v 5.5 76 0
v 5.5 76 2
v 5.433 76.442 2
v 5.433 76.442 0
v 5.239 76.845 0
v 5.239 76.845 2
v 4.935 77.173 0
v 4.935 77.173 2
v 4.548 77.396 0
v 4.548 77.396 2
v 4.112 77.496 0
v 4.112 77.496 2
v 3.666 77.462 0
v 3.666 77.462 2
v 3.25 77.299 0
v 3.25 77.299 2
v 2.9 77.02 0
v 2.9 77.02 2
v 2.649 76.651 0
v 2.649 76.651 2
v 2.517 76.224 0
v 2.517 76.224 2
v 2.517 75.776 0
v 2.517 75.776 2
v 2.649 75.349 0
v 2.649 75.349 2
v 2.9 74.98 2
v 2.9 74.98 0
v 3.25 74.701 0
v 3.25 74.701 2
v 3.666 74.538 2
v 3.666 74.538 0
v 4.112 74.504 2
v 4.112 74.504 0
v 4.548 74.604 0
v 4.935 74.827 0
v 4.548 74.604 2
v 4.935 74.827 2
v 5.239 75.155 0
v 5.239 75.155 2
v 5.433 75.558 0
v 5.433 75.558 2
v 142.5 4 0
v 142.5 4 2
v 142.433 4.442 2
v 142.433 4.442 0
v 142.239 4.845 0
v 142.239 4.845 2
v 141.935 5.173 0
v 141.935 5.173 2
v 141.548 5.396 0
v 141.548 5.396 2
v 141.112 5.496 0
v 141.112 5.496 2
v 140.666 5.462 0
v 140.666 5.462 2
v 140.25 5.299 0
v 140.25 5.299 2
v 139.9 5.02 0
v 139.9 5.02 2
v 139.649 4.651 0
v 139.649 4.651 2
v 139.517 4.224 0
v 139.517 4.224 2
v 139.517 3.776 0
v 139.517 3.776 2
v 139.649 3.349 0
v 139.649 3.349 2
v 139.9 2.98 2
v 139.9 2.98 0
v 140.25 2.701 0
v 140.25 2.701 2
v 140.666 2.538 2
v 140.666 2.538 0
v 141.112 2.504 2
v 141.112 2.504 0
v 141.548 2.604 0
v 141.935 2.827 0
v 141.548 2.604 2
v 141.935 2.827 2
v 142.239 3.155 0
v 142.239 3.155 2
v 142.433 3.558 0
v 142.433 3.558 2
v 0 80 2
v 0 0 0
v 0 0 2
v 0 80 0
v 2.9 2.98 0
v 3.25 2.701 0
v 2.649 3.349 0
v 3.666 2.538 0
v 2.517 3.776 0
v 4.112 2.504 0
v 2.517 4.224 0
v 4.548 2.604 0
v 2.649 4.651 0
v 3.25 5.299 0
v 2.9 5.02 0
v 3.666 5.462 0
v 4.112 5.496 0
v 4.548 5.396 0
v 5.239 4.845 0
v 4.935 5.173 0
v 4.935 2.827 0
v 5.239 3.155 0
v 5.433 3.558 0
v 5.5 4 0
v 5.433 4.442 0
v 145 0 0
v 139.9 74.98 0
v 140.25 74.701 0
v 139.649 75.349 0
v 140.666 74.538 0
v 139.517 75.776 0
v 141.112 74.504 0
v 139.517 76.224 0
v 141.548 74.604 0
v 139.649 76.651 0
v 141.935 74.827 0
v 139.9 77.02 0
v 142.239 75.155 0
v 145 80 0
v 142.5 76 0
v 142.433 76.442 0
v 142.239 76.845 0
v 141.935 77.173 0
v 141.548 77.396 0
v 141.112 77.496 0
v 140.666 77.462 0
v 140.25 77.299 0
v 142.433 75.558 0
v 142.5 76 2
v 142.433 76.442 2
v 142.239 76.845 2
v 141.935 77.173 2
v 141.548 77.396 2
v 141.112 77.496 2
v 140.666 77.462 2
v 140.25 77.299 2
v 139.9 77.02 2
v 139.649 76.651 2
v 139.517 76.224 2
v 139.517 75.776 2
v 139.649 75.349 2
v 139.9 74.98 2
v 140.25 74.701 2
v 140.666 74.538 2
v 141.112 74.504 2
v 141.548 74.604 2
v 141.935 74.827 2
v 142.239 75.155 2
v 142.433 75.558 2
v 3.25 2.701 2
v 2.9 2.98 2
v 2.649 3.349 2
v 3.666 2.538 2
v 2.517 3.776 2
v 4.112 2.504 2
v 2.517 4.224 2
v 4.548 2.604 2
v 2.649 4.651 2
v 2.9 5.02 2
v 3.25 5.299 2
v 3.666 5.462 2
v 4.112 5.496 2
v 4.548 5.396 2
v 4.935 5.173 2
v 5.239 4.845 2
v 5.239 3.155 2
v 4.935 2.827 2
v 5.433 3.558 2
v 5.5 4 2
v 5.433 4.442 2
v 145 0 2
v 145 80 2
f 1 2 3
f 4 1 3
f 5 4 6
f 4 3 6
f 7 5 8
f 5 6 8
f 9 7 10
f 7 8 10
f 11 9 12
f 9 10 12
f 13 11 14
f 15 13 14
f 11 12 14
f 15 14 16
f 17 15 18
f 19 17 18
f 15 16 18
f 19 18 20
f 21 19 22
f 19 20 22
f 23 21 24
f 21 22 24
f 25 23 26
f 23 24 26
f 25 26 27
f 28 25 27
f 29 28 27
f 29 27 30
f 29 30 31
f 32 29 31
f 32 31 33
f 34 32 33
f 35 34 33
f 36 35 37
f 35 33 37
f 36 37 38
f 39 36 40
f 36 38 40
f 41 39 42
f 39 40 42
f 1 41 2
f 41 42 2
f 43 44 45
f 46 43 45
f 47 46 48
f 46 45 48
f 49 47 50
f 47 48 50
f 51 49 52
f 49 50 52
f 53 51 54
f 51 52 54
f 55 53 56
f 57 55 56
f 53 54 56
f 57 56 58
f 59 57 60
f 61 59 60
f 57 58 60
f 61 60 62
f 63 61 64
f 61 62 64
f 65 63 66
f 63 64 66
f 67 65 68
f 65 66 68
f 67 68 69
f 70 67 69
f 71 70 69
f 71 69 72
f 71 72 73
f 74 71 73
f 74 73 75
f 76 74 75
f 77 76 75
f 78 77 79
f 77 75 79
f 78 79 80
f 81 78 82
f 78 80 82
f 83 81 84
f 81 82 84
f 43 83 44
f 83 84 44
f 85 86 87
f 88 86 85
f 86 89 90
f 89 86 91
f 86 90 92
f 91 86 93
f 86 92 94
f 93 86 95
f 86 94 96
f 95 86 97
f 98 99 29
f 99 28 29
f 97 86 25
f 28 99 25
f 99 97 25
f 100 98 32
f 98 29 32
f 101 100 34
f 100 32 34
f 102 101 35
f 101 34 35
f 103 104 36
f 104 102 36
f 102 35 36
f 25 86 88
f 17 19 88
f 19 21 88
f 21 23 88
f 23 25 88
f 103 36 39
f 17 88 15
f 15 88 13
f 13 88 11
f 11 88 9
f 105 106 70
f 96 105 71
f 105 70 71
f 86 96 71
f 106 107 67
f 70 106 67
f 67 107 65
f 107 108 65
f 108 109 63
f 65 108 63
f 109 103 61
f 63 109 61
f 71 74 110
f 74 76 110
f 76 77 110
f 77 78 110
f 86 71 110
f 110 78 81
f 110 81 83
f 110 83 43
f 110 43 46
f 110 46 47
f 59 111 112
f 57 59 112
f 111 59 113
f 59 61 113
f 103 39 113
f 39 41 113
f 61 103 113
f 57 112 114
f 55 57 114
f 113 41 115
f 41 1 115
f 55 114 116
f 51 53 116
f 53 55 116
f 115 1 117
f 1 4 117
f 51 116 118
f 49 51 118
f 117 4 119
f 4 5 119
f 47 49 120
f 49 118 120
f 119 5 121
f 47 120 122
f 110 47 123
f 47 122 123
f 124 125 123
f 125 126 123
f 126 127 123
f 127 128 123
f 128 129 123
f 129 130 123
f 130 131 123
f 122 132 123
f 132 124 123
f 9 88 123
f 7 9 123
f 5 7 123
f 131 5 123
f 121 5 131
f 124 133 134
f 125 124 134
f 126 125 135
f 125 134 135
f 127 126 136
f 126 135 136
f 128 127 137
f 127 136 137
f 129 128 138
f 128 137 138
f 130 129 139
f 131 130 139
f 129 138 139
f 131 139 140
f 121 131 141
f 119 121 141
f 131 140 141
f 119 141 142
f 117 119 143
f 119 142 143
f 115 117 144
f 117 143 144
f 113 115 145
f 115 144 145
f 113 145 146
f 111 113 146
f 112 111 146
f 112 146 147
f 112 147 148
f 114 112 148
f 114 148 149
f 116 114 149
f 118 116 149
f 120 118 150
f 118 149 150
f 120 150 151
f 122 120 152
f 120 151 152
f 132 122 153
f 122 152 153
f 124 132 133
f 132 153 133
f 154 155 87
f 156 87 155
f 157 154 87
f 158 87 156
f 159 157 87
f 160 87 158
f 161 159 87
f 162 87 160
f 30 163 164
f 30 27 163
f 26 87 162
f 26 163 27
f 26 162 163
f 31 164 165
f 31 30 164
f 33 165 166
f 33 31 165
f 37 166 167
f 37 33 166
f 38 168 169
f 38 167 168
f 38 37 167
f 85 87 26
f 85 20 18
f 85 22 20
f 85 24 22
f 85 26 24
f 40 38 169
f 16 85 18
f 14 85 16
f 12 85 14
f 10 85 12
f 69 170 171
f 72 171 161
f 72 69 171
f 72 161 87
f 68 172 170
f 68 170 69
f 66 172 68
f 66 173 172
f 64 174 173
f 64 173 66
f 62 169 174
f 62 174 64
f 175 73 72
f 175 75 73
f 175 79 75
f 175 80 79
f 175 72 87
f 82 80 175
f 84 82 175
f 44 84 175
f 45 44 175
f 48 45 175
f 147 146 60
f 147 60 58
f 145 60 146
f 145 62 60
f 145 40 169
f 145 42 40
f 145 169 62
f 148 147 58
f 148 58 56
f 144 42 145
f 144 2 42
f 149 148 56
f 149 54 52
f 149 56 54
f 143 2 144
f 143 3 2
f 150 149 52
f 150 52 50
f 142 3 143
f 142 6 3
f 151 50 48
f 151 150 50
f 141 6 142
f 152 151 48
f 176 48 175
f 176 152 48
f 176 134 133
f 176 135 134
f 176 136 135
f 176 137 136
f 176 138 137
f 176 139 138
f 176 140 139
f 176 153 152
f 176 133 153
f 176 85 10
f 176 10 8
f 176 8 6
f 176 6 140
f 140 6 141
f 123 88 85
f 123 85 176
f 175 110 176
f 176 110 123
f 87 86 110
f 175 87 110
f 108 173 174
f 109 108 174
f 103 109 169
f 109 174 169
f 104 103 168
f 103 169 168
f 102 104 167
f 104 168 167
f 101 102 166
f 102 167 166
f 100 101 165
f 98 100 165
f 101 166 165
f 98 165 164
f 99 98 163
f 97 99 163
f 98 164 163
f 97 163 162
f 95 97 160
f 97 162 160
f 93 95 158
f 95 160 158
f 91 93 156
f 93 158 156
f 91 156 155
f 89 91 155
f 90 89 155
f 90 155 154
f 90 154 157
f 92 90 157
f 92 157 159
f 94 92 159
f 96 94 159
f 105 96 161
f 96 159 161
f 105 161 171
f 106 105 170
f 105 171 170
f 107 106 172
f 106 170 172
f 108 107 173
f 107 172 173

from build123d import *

# Parameters (mm, degrees)
SKETCH_1_W                  = 145
SKETCH_1_H                  = 80
EXTRUDE_1_DEPTH             = 2
SKETCH_2_R                  = 1.5
CUT_EXTRUDE_1_DEPTH         = 2
PATTERN_LINEAR_1_COUNT      = 2
PATTERN_LINEAR_1_PITCH      = 137
PATTERN_LINEAR_1_COUNT_DIR2 = 2
PATTERN_LINEAR_1_PITCH_DIR2 = 72


with BuildPart() as part:
    # Эскиз1 → Бобышка-Вытянуть1 (new body)
    with BuildSketch(Plane.XY):
        with Locations((72.5, 40)):
            Rectangle(SKETCH_1_W, SKETCH_1_H)
    extrude(amount=EXTRUDE_1_DEPTH)

    # Эскиз2 → Вырез-Вытянуть1 (cut)
    with BuildSketch(Plane.XY.offset(2)):
        with Locations((4, 76)):
            Circle(SKETCH_2_R)
    cut_extrude_1 = extrude(amount=-CUT_EXTRUDE_1_DEPTH, mode=Mode.SUBTRACT)

    # Линейный массив1: Cut-Extrude 1 2 × 2
    with Locations(*[(i * PATTERN_LINEAR_1_PITCH, -j * PATTERN_LINEAR_1_PITCH_DIR2, 0) for i in range(PATTERN_LINEAR_1_COUNT) for j in range(PATTERN_LINEAR_1_COUNT_DIR2) if (i, j) != (0, 0)]):
        add(cut_extrude_1, mode=Mode.SUBTRACT)


solid = part.part
